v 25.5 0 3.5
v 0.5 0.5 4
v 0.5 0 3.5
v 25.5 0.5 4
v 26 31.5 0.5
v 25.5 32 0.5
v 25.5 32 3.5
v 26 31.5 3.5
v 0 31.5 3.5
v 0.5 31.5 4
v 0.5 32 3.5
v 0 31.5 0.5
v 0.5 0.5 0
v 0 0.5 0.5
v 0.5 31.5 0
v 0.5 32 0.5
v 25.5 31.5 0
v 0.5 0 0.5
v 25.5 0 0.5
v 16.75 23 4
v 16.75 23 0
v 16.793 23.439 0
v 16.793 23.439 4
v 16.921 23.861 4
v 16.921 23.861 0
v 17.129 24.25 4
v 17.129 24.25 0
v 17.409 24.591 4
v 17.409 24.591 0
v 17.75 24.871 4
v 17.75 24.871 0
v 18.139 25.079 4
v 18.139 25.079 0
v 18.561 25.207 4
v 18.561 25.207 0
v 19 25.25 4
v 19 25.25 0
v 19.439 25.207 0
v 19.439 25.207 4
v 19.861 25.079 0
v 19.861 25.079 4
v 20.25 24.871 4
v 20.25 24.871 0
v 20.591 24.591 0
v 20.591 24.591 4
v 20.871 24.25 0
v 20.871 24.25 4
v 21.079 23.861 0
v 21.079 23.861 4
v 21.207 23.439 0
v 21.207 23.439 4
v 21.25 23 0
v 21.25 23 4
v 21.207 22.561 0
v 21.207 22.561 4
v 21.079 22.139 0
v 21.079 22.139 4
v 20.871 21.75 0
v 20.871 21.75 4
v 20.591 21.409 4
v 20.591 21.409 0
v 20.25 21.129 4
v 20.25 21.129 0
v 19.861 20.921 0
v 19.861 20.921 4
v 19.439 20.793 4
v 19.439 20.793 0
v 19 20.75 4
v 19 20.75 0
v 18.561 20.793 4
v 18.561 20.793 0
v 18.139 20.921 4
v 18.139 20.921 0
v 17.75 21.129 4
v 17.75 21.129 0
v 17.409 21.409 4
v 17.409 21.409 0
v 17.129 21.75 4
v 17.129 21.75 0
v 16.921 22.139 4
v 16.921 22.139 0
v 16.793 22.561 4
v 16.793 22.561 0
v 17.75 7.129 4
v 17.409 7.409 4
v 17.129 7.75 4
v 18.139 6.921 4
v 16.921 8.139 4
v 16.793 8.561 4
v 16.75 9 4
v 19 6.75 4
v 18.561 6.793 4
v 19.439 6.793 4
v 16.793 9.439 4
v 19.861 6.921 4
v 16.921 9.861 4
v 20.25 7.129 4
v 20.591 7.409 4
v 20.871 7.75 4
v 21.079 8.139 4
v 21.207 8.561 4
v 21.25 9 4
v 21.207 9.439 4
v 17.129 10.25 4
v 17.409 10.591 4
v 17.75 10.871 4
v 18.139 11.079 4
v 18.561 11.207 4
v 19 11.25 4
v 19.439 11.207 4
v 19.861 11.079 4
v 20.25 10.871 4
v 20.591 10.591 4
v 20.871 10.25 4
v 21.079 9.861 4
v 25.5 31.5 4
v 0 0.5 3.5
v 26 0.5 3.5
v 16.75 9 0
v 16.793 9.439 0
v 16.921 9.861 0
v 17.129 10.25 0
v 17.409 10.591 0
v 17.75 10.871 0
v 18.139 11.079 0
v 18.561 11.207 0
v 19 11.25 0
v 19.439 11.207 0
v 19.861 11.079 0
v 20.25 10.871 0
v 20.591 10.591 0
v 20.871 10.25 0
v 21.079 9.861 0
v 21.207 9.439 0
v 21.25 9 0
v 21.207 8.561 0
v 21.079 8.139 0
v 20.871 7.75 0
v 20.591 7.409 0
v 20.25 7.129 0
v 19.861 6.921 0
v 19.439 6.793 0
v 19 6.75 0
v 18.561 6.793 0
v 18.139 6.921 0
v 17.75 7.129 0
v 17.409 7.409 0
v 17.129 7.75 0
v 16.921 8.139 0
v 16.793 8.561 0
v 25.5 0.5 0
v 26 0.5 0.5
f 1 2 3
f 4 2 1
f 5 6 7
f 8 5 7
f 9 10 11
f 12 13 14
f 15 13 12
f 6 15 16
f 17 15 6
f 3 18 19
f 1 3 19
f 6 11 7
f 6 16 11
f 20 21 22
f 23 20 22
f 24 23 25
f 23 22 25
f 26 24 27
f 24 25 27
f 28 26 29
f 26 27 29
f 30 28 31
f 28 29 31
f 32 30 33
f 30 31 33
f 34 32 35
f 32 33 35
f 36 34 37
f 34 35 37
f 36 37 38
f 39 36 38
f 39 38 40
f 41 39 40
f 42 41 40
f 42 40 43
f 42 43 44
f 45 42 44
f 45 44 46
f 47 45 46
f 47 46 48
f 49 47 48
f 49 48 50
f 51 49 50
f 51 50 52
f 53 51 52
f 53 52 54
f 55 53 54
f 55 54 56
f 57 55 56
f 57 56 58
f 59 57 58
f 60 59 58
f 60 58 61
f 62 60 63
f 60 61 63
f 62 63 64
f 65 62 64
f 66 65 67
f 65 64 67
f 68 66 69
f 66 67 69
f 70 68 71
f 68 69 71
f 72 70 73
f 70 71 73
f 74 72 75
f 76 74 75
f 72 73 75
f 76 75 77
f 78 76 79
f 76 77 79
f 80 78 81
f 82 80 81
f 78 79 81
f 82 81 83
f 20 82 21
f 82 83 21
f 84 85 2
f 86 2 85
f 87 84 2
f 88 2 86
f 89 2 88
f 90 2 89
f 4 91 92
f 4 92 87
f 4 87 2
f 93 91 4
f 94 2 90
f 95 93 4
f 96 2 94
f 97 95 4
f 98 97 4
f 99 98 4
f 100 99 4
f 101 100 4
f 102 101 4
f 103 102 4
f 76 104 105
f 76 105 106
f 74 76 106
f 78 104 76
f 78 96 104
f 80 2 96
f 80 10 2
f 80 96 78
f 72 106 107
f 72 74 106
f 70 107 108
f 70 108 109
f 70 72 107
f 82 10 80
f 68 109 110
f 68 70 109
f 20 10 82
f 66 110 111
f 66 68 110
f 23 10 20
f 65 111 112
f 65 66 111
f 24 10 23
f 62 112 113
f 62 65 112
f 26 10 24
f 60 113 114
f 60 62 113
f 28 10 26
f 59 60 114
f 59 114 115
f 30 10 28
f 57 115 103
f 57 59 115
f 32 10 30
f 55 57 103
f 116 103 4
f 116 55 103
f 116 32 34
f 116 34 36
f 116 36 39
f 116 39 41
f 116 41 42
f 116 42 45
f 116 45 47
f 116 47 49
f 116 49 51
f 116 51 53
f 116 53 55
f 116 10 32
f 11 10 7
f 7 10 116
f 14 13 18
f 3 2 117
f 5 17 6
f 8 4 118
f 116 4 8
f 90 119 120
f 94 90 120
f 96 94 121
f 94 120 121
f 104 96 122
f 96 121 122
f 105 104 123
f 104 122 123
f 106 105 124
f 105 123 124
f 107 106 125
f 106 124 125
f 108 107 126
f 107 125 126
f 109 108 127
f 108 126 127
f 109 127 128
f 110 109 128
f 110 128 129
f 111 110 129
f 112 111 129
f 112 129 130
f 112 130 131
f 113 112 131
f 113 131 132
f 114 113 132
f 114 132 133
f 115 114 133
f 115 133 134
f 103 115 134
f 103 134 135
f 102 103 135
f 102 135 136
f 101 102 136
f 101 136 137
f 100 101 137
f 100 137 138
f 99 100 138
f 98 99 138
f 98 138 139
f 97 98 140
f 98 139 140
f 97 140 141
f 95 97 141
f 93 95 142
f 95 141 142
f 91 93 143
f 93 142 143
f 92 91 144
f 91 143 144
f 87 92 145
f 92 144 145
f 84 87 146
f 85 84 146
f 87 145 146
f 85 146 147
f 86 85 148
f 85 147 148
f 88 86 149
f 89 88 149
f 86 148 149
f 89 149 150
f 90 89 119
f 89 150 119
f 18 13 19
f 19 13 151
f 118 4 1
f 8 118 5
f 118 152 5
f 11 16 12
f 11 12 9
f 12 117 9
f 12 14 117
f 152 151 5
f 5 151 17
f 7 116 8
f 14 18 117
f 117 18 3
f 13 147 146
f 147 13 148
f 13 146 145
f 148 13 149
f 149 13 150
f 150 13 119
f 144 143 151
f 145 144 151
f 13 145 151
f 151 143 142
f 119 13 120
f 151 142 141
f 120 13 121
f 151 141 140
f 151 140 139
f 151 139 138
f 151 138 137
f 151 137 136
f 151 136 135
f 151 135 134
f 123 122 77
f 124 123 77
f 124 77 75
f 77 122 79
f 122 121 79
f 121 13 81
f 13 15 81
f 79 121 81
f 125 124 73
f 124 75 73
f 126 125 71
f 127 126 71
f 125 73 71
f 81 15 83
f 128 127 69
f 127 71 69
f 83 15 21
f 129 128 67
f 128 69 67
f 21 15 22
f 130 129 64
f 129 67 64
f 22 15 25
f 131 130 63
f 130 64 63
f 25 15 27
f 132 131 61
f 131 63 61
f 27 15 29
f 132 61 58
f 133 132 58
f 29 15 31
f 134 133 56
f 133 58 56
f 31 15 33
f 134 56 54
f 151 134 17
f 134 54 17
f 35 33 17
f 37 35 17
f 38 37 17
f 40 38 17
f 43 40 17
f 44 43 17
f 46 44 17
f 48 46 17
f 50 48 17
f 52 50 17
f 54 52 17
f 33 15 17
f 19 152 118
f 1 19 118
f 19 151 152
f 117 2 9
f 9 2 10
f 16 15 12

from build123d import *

# Parameters (mm, degrees)
SKETCH_1_W          = 26
SKETCH_1_H          = 32
EXTRUDE_1_DEPTH     = 4
CHAMFER_1_SIZE      = 0.5
SKETCH_2_R          = 2.25
CUT_EXTRUDE_1_DEPTH = 42.424630354


with BuildPart() as part:
    # 草图1 → 凸台-拉伸1 (new body)
    with BuildSketch(Plane.XY):
        with Locations((13, 16)):
            Rectangle(SKETCH_1_W, SKETCH_1_H)
    extrude(amount=EXTRUDE_1_DEPTH)

    # 倒角1
    chamfer_1_edges = [part.edges().sort_by_distance(p)[0] for p in [
        (26, 16, 4),
        (13, 32, 4),
        (0, 16, 4),
        (13, 32, 0),
        (26, 16, 0),
        (13, 0, 0),
        (0, 16, 0),
        (13, 0, 4),
        (0, 32, 2),
        (26, 32, 2),
        (26, 0, 2),
        (0, 0, 2),
    ]]
    chamfer(chamfer_1_edges, length=CHAMFER_1_SIZE)

    # 草图2 → 切除-拉伸1 (cut, through all)
    with BuildSketch(Plane(origin=(0, 0, 0), x_dir=(-1, 0, 0), z_dir=(0, 0, -1))):
        with Locations((-19, 9)):
            Circle(SKETCH_2_R)
        with Locations((-19, 23)):
            Circle(SKETCH_2_R)
    extrude(amount=-CUT_EXTRUDE_1_DEPTH, mode=Mode.SUBTRACT)


solid = part.part
